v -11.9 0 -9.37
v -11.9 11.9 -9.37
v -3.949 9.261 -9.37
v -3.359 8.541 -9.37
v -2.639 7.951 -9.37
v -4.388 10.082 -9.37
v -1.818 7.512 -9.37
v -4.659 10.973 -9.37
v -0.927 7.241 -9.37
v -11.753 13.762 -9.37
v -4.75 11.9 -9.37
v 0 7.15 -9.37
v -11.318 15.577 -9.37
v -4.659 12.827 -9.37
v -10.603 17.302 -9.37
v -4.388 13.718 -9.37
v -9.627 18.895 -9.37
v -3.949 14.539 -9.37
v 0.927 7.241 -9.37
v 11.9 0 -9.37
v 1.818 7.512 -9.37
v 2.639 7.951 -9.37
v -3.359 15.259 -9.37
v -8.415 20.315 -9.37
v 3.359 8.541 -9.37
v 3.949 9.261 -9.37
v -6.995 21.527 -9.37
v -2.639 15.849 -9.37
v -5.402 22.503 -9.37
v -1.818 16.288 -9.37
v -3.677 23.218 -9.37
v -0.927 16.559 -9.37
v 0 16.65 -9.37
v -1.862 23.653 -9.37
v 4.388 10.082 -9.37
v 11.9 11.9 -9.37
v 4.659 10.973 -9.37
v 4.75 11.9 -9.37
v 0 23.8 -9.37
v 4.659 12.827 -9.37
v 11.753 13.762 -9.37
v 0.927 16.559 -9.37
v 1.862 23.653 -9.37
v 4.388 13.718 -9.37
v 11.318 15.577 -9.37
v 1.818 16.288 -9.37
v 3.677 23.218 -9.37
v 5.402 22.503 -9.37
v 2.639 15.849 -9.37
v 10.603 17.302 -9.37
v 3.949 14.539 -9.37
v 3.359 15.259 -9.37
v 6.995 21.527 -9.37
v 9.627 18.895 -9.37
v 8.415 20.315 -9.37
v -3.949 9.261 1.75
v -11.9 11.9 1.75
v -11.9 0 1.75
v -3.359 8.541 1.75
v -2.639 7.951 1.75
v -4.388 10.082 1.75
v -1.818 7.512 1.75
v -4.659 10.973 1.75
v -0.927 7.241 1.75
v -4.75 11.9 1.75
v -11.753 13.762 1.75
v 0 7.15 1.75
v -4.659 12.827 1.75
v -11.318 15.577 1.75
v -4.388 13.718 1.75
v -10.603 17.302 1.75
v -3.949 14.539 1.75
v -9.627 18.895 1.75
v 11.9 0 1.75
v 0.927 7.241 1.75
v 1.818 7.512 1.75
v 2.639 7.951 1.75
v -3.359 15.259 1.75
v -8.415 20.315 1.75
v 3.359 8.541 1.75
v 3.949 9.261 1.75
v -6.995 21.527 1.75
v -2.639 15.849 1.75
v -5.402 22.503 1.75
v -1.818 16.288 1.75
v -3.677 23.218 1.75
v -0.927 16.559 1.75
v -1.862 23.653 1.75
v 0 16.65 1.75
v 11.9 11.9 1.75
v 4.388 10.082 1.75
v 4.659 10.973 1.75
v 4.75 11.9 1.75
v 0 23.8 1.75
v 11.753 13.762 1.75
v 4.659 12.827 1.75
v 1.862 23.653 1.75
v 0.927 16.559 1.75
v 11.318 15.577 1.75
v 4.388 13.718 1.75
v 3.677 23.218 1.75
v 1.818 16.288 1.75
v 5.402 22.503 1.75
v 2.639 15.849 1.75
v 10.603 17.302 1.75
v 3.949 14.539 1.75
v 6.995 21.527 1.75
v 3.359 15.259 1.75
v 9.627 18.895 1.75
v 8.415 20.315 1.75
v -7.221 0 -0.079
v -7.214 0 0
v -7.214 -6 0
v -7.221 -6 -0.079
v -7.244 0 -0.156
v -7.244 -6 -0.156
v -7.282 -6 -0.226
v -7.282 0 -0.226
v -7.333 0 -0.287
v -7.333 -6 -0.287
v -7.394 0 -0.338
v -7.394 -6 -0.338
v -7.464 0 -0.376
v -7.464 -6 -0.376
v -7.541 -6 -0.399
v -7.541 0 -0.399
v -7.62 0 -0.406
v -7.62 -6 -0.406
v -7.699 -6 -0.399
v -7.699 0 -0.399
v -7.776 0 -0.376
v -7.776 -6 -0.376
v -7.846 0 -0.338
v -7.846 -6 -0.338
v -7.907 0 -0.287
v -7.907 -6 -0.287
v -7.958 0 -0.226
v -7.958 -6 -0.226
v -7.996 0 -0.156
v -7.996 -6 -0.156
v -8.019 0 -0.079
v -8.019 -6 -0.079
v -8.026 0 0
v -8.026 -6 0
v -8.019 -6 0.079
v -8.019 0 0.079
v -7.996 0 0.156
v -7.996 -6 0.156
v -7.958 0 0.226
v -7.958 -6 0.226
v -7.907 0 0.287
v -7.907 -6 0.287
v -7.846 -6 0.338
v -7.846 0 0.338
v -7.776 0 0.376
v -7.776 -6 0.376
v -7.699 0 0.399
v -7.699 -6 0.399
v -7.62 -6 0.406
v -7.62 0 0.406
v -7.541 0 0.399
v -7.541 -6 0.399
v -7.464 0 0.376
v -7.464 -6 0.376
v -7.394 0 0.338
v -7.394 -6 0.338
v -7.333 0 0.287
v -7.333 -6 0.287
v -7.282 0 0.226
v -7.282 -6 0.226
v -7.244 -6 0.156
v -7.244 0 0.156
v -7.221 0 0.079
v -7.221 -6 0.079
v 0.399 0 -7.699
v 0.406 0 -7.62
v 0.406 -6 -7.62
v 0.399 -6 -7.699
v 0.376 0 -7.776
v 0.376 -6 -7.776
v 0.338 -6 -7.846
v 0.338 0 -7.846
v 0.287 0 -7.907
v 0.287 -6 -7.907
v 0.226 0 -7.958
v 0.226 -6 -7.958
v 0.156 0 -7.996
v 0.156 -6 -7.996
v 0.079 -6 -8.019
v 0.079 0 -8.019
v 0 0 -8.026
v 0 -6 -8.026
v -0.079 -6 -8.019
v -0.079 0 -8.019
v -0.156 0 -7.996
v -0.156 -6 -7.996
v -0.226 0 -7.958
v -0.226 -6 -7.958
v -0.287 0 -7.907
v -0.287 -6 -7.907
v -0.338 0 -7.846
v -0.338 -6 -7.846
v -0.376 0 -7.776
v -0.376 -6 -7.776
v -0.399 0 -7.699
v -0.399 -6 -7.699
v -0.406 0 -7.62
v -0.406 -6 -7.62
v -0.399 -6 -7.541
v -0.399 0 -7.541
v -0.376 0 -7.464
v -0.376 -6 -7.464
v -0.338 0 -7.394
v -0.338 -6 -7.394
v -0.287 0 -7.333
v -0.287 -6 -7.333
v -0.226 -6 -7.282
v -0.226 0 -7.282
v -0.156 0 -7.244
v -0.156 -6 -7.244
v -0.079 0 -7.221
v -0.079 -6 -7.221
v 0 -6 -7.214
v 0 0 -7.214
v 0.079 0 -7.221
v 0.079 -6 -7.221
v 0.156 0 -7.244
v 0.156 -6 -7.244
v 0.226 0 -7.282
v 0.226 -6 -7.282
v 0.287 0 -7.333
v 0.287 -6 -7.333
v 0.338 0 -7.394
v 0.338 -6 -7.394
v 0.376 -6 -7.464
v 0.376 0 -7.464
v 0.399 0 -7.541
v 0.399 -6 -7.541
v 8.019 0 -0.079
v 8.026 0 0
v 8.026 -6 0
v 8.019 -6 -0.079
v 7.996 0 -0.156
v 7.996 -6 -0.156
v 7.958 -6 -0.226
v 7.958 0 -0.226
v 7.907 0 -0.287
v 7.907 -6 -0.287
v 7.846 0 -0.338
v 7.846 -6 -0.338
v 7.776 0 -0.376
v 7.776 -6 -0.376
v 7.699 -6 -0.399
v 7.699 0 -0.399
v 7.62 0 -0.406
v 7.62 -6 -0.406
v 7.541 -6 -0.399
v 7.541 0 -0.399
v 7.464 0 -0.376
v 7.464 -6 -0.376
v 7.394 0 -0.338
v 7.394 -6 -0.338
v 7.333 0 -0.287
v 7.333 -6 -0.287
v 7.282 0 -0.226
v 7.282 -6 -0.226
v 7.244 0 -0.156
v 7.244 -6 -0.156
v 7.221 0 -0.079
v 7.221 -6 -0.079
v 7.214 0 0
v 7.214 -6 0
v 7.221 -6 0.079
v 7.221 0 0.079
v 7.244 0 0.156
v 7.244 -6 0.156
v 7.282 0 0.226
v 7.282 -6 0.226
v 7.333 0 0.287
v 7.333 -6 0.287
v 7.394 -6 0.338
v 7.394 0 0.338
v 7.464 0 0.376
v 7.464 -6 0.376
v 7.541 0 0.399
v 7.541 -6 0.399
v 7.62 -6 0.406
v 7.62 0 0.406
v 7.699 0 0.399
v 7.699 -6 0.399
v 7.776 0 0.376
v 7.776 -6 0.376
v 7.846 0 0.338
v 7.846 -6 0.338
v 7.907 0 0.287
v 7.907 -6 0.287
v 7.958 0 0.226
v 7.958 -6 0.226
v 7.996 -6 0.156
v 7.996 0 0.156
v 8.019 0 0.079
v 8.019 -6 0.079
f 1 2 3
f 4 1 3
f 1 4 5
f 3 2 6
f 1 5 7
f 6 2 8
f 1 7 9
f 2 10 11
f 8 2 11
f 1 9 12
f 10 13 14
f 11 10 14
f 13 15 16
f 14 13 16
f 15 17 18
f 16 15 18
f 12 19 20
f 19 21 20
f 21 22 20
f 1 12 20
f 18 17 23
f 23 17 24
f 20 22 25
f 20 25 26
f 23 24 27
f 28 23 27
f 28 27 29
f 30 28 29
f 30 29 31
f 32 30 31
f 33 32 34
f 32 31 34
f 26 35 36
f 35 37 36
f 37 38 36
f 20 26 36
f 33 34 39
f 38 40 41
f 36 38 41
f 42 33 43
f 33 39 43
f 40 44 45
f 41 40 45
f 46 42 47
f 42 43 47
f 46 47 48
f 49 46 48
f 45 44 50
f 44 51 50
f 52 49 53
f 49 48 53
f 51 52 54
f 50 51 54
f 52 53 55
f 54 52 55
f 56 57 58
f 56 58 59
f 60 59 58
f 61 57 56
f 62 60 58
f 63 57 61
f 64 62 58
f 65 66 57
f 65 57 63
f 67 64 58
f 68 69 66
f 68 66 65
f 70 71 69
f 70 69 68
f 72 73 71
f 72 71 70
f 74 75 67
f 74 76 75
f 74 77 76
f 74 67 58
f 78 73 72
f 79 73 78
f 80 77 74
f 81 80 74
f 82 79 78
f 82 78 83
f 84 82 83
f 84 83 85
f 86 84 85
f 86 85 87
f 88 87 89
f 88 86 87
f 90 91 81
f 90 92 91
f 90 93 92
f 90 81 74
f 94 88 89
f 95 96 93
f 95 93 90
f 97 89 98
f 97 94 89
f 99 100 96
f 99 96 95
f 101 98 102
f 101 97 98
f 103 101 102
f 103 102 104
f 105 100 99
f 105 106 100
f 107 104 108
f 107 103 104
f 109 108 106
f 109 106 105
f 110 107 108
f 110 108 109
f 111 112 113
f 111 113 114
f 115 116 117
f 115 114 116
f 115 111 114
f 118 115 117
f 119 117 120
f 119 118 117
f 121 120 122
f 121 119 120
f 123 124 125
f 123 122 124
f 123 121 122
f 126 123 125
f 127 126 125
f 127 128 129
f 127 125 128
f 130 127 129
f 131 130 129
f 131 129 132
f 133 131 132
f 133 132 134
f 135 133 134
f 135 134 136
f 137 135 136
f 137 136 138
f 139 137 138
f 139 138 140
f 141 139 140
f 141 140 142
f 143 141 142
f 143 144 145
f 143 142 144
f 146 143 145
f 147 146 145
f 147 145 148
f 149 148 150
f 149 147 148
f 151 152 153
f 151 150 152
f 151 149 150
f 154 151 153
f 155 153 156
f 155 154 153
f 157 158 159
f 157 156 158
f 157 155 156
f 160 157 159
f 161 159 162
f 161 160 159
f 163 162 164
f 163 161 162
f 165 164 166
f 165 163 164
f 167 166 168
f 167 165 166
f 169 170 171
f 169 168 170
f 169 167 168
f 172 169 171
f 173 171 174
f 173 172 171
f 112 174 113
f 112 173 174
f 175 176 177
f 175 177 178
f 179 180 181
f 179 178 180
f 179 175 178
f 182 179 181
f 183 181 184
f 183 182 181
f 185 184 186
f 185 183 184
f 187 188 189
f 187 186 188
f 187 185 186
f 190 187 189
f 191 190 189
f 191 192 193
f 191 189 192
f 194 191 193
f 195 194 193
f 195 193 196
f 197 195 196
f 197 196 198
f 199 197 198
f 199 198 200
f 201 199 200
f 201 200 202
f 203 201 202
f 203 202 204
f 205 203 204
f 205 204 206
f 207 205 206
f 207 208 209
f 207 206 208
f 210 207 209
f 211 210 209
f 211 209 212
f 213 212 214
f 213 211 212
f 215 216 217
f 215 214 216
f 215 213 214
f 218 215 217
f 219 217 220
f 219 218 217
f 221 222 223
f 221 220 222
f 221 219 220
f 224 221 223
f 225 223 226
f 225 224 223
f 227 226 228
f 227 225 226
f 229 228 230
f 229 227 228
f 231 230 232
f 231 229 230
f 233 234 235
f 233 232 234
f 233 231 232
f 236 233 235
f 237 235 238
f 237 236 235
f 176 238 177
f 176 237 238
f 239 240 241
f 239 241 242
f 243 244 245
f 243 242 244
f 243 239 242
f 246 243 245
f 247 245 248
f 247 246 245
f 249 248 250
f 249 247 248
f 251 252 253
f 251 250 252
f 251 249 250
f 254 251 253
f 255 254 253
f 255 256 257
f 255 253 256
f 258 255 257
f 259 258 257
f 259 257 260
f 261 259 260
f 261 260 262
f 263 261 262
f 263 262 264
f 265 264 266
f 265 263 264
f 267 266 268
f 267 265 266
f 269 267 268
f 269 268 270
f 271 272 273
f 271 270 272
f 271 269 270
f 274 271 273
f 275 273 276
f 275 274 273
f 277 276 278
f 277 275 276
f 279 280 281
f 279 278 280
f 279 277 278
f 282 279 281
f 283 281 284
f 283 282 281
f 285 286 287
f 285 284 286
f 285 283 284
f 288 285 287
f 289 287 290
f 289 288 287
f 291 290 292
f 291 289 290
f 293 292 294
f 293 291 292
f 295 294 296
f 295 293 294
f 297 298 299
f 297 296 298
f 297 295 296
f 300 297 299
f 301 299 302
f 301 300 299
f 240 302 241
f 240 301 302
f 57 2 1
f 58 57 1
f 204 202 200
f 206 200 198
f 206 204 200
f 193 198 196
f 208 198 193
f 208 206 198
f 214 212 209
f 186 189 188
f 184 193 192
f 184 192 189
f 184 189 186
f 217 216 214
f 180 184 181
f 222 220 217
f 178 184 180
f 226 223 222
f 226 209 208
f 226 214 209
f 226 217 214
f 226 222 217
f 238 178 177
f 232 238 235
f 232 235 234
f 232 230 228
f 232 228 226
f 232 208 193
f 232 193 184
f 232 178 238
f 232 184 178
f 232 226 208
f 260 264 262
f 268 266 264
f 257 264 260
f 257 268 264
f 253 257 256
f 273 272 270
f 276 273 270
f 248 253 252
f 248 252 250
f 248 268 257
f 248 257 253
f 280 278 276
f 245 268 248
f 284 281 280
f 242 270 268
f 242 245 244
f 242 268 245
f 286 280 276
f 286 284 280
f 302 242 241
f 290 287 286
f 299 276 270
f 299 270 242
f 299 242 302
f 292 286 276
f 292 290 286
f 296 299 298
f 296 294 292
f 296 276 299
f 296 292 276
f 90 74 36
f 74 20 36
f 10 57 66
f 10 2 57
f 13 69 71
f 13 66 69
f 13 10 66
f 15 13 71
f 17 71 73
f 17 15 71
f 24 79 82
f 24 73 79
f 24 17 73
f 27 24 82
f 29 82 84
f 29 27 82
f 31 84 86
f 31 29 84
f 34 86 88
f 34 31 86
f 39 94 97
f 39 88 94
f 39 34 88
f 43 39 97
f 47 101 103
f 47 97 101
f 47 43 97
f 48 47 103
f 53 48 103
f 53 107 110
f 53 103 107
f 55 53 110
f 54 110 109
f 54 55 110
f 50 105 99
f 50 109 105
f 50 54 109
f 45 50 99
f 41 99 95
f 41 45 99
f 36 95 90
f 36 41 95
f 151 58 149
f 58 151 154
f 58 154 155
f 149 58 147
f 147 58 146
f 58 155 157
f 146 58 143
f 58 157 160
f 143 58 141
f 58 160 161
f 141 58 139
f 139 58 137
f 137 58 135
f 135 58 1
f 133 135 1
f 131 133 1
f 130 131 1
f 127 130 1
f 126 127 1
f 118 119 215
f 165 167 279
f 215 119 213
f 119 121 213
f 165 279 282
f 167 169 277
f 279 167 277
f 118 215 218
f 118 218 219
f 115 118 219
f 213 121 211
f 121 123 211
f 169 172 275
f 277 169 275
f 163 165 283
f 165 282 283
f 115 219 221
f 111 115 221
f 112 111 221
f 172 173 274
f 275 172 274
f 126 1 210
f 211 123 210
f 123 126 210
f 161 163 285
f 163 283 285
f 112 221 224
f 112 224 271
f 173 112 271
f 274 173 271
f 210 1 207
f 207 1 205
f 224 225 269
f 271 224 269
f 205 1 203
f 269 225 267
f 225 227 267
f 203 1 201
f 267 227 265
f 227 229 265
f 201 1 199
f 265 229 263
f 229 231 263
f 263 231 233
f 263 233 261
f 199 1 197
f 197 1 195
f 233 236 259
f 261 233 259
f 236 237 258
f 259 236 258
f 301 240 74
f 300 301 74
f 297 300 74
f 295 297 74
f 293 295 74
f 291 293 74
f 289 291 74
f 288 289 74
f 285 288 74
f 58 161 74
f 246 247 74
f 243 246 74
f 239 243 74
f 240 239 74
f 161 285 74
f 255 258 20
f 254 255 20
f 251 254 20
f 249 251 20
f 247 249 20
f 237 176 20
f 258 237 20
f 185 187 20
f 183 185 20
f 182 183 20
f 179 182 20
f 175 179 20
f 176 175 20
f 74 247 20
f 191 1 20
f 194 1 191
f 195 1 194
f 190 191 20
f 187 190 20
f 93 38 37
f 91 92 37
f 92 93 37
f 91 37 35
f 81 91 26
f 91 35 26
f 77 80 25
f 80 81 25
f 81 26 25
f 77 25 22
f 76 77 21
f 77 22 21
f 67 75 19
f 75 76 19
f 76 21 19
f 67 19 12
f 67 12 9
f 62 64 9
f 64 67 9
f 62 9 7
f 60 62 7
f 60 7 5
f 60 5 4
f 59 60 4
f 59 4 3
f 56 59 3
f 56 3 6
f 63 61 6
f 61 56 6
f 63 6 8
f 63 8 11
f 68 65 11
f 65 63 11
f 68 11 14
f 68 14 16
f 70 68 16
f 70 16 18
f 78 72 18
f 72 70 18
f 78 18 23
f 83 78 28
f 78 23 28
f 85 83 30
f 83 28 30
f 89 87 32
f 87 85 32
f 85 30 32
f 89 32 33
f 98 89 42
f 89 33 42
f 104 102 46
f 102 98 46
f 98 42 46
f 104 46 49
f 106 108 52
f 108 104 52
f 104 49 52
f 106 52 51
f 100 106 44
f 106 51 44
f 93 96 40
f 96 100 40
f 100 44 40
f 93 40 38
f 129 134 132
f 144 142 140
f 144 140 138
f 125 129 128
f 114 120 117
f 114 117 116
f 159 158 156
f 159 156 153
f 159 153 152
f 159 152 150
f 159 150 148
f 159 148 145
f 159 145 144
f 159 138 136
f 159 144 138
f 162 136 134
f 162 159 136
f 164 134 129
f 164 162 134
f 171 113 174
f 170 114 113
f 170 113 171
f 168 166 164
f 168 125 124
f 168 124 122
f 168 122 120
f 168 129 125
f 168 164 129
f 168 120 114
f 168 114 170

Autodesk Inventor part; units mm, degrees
ref_plane "YZ Plane" through (0, 0, 0) normal (1, 0, 0) x (0, 1, 0)
ref_plane "XZ Plane" through (0, 0, 0) normal (0, 1, 0) x (-1, 0, 0)
ref_plane "XY Plane" through (0, 0, 0) normal (0, 0, 1) x (1, 0, 0)
sketch "Sketch1" plane through (0, 0, 0) normal (0, 0, 1) x (1, 0, 0)
  arc A0 (11.9, 11.9) -> (-11.9, 11.9) centre (0, 11.9) ccw
  line L0 (-11.9, 11.9) -> (-11.9, 0)
  line L1 (-11.9, 0) -> (11.9, 0)
  line L2 (11.9, 0) -> (11.9, 11.9)
  circle A1 centre (0, 11.9) radius 4.75
  point P0 (0, 0)
  dimension "d0" = 11.9
  dimension "d1" = 180
  dimension "d2" = 11.9
  dimension "d3" = 9.5
  dimension "d4" = 23.8
  dimension "d5" = 0
extrude "Extrusion1" add sketch "Sketch1" along normal blind 1.75 and the other way blind 9.37
sketch "Sketch2" plane through (-11.9, 0, 1.75) normal (0, -1, 0) x (1, 0, 0)
  circle A0 centre (4.28, -1.75) radius 0.4065
  circle A1 centre (19.52, -1.75) radius 0.4065
  circle A2 centre (11.9, -9.37) radius 0.4065
  point P0 (11.9, -1.75)
  dimension "d10" = 0.813
  dimension "d11" = 0.813
  dimension "d12" = 15.24
  dimension "d13" = 7.62
  dimension "d14" = 0.813
  dimension "d15" = 7.62
extrude "Extrusion2" add sketch "Sketch2" along normal blind 6
equation "\"d11\" = d10"
equation "\"d13\" = 0.5 * d12"
equation "\"d14\" = d10"
properties part number "AC1015"
